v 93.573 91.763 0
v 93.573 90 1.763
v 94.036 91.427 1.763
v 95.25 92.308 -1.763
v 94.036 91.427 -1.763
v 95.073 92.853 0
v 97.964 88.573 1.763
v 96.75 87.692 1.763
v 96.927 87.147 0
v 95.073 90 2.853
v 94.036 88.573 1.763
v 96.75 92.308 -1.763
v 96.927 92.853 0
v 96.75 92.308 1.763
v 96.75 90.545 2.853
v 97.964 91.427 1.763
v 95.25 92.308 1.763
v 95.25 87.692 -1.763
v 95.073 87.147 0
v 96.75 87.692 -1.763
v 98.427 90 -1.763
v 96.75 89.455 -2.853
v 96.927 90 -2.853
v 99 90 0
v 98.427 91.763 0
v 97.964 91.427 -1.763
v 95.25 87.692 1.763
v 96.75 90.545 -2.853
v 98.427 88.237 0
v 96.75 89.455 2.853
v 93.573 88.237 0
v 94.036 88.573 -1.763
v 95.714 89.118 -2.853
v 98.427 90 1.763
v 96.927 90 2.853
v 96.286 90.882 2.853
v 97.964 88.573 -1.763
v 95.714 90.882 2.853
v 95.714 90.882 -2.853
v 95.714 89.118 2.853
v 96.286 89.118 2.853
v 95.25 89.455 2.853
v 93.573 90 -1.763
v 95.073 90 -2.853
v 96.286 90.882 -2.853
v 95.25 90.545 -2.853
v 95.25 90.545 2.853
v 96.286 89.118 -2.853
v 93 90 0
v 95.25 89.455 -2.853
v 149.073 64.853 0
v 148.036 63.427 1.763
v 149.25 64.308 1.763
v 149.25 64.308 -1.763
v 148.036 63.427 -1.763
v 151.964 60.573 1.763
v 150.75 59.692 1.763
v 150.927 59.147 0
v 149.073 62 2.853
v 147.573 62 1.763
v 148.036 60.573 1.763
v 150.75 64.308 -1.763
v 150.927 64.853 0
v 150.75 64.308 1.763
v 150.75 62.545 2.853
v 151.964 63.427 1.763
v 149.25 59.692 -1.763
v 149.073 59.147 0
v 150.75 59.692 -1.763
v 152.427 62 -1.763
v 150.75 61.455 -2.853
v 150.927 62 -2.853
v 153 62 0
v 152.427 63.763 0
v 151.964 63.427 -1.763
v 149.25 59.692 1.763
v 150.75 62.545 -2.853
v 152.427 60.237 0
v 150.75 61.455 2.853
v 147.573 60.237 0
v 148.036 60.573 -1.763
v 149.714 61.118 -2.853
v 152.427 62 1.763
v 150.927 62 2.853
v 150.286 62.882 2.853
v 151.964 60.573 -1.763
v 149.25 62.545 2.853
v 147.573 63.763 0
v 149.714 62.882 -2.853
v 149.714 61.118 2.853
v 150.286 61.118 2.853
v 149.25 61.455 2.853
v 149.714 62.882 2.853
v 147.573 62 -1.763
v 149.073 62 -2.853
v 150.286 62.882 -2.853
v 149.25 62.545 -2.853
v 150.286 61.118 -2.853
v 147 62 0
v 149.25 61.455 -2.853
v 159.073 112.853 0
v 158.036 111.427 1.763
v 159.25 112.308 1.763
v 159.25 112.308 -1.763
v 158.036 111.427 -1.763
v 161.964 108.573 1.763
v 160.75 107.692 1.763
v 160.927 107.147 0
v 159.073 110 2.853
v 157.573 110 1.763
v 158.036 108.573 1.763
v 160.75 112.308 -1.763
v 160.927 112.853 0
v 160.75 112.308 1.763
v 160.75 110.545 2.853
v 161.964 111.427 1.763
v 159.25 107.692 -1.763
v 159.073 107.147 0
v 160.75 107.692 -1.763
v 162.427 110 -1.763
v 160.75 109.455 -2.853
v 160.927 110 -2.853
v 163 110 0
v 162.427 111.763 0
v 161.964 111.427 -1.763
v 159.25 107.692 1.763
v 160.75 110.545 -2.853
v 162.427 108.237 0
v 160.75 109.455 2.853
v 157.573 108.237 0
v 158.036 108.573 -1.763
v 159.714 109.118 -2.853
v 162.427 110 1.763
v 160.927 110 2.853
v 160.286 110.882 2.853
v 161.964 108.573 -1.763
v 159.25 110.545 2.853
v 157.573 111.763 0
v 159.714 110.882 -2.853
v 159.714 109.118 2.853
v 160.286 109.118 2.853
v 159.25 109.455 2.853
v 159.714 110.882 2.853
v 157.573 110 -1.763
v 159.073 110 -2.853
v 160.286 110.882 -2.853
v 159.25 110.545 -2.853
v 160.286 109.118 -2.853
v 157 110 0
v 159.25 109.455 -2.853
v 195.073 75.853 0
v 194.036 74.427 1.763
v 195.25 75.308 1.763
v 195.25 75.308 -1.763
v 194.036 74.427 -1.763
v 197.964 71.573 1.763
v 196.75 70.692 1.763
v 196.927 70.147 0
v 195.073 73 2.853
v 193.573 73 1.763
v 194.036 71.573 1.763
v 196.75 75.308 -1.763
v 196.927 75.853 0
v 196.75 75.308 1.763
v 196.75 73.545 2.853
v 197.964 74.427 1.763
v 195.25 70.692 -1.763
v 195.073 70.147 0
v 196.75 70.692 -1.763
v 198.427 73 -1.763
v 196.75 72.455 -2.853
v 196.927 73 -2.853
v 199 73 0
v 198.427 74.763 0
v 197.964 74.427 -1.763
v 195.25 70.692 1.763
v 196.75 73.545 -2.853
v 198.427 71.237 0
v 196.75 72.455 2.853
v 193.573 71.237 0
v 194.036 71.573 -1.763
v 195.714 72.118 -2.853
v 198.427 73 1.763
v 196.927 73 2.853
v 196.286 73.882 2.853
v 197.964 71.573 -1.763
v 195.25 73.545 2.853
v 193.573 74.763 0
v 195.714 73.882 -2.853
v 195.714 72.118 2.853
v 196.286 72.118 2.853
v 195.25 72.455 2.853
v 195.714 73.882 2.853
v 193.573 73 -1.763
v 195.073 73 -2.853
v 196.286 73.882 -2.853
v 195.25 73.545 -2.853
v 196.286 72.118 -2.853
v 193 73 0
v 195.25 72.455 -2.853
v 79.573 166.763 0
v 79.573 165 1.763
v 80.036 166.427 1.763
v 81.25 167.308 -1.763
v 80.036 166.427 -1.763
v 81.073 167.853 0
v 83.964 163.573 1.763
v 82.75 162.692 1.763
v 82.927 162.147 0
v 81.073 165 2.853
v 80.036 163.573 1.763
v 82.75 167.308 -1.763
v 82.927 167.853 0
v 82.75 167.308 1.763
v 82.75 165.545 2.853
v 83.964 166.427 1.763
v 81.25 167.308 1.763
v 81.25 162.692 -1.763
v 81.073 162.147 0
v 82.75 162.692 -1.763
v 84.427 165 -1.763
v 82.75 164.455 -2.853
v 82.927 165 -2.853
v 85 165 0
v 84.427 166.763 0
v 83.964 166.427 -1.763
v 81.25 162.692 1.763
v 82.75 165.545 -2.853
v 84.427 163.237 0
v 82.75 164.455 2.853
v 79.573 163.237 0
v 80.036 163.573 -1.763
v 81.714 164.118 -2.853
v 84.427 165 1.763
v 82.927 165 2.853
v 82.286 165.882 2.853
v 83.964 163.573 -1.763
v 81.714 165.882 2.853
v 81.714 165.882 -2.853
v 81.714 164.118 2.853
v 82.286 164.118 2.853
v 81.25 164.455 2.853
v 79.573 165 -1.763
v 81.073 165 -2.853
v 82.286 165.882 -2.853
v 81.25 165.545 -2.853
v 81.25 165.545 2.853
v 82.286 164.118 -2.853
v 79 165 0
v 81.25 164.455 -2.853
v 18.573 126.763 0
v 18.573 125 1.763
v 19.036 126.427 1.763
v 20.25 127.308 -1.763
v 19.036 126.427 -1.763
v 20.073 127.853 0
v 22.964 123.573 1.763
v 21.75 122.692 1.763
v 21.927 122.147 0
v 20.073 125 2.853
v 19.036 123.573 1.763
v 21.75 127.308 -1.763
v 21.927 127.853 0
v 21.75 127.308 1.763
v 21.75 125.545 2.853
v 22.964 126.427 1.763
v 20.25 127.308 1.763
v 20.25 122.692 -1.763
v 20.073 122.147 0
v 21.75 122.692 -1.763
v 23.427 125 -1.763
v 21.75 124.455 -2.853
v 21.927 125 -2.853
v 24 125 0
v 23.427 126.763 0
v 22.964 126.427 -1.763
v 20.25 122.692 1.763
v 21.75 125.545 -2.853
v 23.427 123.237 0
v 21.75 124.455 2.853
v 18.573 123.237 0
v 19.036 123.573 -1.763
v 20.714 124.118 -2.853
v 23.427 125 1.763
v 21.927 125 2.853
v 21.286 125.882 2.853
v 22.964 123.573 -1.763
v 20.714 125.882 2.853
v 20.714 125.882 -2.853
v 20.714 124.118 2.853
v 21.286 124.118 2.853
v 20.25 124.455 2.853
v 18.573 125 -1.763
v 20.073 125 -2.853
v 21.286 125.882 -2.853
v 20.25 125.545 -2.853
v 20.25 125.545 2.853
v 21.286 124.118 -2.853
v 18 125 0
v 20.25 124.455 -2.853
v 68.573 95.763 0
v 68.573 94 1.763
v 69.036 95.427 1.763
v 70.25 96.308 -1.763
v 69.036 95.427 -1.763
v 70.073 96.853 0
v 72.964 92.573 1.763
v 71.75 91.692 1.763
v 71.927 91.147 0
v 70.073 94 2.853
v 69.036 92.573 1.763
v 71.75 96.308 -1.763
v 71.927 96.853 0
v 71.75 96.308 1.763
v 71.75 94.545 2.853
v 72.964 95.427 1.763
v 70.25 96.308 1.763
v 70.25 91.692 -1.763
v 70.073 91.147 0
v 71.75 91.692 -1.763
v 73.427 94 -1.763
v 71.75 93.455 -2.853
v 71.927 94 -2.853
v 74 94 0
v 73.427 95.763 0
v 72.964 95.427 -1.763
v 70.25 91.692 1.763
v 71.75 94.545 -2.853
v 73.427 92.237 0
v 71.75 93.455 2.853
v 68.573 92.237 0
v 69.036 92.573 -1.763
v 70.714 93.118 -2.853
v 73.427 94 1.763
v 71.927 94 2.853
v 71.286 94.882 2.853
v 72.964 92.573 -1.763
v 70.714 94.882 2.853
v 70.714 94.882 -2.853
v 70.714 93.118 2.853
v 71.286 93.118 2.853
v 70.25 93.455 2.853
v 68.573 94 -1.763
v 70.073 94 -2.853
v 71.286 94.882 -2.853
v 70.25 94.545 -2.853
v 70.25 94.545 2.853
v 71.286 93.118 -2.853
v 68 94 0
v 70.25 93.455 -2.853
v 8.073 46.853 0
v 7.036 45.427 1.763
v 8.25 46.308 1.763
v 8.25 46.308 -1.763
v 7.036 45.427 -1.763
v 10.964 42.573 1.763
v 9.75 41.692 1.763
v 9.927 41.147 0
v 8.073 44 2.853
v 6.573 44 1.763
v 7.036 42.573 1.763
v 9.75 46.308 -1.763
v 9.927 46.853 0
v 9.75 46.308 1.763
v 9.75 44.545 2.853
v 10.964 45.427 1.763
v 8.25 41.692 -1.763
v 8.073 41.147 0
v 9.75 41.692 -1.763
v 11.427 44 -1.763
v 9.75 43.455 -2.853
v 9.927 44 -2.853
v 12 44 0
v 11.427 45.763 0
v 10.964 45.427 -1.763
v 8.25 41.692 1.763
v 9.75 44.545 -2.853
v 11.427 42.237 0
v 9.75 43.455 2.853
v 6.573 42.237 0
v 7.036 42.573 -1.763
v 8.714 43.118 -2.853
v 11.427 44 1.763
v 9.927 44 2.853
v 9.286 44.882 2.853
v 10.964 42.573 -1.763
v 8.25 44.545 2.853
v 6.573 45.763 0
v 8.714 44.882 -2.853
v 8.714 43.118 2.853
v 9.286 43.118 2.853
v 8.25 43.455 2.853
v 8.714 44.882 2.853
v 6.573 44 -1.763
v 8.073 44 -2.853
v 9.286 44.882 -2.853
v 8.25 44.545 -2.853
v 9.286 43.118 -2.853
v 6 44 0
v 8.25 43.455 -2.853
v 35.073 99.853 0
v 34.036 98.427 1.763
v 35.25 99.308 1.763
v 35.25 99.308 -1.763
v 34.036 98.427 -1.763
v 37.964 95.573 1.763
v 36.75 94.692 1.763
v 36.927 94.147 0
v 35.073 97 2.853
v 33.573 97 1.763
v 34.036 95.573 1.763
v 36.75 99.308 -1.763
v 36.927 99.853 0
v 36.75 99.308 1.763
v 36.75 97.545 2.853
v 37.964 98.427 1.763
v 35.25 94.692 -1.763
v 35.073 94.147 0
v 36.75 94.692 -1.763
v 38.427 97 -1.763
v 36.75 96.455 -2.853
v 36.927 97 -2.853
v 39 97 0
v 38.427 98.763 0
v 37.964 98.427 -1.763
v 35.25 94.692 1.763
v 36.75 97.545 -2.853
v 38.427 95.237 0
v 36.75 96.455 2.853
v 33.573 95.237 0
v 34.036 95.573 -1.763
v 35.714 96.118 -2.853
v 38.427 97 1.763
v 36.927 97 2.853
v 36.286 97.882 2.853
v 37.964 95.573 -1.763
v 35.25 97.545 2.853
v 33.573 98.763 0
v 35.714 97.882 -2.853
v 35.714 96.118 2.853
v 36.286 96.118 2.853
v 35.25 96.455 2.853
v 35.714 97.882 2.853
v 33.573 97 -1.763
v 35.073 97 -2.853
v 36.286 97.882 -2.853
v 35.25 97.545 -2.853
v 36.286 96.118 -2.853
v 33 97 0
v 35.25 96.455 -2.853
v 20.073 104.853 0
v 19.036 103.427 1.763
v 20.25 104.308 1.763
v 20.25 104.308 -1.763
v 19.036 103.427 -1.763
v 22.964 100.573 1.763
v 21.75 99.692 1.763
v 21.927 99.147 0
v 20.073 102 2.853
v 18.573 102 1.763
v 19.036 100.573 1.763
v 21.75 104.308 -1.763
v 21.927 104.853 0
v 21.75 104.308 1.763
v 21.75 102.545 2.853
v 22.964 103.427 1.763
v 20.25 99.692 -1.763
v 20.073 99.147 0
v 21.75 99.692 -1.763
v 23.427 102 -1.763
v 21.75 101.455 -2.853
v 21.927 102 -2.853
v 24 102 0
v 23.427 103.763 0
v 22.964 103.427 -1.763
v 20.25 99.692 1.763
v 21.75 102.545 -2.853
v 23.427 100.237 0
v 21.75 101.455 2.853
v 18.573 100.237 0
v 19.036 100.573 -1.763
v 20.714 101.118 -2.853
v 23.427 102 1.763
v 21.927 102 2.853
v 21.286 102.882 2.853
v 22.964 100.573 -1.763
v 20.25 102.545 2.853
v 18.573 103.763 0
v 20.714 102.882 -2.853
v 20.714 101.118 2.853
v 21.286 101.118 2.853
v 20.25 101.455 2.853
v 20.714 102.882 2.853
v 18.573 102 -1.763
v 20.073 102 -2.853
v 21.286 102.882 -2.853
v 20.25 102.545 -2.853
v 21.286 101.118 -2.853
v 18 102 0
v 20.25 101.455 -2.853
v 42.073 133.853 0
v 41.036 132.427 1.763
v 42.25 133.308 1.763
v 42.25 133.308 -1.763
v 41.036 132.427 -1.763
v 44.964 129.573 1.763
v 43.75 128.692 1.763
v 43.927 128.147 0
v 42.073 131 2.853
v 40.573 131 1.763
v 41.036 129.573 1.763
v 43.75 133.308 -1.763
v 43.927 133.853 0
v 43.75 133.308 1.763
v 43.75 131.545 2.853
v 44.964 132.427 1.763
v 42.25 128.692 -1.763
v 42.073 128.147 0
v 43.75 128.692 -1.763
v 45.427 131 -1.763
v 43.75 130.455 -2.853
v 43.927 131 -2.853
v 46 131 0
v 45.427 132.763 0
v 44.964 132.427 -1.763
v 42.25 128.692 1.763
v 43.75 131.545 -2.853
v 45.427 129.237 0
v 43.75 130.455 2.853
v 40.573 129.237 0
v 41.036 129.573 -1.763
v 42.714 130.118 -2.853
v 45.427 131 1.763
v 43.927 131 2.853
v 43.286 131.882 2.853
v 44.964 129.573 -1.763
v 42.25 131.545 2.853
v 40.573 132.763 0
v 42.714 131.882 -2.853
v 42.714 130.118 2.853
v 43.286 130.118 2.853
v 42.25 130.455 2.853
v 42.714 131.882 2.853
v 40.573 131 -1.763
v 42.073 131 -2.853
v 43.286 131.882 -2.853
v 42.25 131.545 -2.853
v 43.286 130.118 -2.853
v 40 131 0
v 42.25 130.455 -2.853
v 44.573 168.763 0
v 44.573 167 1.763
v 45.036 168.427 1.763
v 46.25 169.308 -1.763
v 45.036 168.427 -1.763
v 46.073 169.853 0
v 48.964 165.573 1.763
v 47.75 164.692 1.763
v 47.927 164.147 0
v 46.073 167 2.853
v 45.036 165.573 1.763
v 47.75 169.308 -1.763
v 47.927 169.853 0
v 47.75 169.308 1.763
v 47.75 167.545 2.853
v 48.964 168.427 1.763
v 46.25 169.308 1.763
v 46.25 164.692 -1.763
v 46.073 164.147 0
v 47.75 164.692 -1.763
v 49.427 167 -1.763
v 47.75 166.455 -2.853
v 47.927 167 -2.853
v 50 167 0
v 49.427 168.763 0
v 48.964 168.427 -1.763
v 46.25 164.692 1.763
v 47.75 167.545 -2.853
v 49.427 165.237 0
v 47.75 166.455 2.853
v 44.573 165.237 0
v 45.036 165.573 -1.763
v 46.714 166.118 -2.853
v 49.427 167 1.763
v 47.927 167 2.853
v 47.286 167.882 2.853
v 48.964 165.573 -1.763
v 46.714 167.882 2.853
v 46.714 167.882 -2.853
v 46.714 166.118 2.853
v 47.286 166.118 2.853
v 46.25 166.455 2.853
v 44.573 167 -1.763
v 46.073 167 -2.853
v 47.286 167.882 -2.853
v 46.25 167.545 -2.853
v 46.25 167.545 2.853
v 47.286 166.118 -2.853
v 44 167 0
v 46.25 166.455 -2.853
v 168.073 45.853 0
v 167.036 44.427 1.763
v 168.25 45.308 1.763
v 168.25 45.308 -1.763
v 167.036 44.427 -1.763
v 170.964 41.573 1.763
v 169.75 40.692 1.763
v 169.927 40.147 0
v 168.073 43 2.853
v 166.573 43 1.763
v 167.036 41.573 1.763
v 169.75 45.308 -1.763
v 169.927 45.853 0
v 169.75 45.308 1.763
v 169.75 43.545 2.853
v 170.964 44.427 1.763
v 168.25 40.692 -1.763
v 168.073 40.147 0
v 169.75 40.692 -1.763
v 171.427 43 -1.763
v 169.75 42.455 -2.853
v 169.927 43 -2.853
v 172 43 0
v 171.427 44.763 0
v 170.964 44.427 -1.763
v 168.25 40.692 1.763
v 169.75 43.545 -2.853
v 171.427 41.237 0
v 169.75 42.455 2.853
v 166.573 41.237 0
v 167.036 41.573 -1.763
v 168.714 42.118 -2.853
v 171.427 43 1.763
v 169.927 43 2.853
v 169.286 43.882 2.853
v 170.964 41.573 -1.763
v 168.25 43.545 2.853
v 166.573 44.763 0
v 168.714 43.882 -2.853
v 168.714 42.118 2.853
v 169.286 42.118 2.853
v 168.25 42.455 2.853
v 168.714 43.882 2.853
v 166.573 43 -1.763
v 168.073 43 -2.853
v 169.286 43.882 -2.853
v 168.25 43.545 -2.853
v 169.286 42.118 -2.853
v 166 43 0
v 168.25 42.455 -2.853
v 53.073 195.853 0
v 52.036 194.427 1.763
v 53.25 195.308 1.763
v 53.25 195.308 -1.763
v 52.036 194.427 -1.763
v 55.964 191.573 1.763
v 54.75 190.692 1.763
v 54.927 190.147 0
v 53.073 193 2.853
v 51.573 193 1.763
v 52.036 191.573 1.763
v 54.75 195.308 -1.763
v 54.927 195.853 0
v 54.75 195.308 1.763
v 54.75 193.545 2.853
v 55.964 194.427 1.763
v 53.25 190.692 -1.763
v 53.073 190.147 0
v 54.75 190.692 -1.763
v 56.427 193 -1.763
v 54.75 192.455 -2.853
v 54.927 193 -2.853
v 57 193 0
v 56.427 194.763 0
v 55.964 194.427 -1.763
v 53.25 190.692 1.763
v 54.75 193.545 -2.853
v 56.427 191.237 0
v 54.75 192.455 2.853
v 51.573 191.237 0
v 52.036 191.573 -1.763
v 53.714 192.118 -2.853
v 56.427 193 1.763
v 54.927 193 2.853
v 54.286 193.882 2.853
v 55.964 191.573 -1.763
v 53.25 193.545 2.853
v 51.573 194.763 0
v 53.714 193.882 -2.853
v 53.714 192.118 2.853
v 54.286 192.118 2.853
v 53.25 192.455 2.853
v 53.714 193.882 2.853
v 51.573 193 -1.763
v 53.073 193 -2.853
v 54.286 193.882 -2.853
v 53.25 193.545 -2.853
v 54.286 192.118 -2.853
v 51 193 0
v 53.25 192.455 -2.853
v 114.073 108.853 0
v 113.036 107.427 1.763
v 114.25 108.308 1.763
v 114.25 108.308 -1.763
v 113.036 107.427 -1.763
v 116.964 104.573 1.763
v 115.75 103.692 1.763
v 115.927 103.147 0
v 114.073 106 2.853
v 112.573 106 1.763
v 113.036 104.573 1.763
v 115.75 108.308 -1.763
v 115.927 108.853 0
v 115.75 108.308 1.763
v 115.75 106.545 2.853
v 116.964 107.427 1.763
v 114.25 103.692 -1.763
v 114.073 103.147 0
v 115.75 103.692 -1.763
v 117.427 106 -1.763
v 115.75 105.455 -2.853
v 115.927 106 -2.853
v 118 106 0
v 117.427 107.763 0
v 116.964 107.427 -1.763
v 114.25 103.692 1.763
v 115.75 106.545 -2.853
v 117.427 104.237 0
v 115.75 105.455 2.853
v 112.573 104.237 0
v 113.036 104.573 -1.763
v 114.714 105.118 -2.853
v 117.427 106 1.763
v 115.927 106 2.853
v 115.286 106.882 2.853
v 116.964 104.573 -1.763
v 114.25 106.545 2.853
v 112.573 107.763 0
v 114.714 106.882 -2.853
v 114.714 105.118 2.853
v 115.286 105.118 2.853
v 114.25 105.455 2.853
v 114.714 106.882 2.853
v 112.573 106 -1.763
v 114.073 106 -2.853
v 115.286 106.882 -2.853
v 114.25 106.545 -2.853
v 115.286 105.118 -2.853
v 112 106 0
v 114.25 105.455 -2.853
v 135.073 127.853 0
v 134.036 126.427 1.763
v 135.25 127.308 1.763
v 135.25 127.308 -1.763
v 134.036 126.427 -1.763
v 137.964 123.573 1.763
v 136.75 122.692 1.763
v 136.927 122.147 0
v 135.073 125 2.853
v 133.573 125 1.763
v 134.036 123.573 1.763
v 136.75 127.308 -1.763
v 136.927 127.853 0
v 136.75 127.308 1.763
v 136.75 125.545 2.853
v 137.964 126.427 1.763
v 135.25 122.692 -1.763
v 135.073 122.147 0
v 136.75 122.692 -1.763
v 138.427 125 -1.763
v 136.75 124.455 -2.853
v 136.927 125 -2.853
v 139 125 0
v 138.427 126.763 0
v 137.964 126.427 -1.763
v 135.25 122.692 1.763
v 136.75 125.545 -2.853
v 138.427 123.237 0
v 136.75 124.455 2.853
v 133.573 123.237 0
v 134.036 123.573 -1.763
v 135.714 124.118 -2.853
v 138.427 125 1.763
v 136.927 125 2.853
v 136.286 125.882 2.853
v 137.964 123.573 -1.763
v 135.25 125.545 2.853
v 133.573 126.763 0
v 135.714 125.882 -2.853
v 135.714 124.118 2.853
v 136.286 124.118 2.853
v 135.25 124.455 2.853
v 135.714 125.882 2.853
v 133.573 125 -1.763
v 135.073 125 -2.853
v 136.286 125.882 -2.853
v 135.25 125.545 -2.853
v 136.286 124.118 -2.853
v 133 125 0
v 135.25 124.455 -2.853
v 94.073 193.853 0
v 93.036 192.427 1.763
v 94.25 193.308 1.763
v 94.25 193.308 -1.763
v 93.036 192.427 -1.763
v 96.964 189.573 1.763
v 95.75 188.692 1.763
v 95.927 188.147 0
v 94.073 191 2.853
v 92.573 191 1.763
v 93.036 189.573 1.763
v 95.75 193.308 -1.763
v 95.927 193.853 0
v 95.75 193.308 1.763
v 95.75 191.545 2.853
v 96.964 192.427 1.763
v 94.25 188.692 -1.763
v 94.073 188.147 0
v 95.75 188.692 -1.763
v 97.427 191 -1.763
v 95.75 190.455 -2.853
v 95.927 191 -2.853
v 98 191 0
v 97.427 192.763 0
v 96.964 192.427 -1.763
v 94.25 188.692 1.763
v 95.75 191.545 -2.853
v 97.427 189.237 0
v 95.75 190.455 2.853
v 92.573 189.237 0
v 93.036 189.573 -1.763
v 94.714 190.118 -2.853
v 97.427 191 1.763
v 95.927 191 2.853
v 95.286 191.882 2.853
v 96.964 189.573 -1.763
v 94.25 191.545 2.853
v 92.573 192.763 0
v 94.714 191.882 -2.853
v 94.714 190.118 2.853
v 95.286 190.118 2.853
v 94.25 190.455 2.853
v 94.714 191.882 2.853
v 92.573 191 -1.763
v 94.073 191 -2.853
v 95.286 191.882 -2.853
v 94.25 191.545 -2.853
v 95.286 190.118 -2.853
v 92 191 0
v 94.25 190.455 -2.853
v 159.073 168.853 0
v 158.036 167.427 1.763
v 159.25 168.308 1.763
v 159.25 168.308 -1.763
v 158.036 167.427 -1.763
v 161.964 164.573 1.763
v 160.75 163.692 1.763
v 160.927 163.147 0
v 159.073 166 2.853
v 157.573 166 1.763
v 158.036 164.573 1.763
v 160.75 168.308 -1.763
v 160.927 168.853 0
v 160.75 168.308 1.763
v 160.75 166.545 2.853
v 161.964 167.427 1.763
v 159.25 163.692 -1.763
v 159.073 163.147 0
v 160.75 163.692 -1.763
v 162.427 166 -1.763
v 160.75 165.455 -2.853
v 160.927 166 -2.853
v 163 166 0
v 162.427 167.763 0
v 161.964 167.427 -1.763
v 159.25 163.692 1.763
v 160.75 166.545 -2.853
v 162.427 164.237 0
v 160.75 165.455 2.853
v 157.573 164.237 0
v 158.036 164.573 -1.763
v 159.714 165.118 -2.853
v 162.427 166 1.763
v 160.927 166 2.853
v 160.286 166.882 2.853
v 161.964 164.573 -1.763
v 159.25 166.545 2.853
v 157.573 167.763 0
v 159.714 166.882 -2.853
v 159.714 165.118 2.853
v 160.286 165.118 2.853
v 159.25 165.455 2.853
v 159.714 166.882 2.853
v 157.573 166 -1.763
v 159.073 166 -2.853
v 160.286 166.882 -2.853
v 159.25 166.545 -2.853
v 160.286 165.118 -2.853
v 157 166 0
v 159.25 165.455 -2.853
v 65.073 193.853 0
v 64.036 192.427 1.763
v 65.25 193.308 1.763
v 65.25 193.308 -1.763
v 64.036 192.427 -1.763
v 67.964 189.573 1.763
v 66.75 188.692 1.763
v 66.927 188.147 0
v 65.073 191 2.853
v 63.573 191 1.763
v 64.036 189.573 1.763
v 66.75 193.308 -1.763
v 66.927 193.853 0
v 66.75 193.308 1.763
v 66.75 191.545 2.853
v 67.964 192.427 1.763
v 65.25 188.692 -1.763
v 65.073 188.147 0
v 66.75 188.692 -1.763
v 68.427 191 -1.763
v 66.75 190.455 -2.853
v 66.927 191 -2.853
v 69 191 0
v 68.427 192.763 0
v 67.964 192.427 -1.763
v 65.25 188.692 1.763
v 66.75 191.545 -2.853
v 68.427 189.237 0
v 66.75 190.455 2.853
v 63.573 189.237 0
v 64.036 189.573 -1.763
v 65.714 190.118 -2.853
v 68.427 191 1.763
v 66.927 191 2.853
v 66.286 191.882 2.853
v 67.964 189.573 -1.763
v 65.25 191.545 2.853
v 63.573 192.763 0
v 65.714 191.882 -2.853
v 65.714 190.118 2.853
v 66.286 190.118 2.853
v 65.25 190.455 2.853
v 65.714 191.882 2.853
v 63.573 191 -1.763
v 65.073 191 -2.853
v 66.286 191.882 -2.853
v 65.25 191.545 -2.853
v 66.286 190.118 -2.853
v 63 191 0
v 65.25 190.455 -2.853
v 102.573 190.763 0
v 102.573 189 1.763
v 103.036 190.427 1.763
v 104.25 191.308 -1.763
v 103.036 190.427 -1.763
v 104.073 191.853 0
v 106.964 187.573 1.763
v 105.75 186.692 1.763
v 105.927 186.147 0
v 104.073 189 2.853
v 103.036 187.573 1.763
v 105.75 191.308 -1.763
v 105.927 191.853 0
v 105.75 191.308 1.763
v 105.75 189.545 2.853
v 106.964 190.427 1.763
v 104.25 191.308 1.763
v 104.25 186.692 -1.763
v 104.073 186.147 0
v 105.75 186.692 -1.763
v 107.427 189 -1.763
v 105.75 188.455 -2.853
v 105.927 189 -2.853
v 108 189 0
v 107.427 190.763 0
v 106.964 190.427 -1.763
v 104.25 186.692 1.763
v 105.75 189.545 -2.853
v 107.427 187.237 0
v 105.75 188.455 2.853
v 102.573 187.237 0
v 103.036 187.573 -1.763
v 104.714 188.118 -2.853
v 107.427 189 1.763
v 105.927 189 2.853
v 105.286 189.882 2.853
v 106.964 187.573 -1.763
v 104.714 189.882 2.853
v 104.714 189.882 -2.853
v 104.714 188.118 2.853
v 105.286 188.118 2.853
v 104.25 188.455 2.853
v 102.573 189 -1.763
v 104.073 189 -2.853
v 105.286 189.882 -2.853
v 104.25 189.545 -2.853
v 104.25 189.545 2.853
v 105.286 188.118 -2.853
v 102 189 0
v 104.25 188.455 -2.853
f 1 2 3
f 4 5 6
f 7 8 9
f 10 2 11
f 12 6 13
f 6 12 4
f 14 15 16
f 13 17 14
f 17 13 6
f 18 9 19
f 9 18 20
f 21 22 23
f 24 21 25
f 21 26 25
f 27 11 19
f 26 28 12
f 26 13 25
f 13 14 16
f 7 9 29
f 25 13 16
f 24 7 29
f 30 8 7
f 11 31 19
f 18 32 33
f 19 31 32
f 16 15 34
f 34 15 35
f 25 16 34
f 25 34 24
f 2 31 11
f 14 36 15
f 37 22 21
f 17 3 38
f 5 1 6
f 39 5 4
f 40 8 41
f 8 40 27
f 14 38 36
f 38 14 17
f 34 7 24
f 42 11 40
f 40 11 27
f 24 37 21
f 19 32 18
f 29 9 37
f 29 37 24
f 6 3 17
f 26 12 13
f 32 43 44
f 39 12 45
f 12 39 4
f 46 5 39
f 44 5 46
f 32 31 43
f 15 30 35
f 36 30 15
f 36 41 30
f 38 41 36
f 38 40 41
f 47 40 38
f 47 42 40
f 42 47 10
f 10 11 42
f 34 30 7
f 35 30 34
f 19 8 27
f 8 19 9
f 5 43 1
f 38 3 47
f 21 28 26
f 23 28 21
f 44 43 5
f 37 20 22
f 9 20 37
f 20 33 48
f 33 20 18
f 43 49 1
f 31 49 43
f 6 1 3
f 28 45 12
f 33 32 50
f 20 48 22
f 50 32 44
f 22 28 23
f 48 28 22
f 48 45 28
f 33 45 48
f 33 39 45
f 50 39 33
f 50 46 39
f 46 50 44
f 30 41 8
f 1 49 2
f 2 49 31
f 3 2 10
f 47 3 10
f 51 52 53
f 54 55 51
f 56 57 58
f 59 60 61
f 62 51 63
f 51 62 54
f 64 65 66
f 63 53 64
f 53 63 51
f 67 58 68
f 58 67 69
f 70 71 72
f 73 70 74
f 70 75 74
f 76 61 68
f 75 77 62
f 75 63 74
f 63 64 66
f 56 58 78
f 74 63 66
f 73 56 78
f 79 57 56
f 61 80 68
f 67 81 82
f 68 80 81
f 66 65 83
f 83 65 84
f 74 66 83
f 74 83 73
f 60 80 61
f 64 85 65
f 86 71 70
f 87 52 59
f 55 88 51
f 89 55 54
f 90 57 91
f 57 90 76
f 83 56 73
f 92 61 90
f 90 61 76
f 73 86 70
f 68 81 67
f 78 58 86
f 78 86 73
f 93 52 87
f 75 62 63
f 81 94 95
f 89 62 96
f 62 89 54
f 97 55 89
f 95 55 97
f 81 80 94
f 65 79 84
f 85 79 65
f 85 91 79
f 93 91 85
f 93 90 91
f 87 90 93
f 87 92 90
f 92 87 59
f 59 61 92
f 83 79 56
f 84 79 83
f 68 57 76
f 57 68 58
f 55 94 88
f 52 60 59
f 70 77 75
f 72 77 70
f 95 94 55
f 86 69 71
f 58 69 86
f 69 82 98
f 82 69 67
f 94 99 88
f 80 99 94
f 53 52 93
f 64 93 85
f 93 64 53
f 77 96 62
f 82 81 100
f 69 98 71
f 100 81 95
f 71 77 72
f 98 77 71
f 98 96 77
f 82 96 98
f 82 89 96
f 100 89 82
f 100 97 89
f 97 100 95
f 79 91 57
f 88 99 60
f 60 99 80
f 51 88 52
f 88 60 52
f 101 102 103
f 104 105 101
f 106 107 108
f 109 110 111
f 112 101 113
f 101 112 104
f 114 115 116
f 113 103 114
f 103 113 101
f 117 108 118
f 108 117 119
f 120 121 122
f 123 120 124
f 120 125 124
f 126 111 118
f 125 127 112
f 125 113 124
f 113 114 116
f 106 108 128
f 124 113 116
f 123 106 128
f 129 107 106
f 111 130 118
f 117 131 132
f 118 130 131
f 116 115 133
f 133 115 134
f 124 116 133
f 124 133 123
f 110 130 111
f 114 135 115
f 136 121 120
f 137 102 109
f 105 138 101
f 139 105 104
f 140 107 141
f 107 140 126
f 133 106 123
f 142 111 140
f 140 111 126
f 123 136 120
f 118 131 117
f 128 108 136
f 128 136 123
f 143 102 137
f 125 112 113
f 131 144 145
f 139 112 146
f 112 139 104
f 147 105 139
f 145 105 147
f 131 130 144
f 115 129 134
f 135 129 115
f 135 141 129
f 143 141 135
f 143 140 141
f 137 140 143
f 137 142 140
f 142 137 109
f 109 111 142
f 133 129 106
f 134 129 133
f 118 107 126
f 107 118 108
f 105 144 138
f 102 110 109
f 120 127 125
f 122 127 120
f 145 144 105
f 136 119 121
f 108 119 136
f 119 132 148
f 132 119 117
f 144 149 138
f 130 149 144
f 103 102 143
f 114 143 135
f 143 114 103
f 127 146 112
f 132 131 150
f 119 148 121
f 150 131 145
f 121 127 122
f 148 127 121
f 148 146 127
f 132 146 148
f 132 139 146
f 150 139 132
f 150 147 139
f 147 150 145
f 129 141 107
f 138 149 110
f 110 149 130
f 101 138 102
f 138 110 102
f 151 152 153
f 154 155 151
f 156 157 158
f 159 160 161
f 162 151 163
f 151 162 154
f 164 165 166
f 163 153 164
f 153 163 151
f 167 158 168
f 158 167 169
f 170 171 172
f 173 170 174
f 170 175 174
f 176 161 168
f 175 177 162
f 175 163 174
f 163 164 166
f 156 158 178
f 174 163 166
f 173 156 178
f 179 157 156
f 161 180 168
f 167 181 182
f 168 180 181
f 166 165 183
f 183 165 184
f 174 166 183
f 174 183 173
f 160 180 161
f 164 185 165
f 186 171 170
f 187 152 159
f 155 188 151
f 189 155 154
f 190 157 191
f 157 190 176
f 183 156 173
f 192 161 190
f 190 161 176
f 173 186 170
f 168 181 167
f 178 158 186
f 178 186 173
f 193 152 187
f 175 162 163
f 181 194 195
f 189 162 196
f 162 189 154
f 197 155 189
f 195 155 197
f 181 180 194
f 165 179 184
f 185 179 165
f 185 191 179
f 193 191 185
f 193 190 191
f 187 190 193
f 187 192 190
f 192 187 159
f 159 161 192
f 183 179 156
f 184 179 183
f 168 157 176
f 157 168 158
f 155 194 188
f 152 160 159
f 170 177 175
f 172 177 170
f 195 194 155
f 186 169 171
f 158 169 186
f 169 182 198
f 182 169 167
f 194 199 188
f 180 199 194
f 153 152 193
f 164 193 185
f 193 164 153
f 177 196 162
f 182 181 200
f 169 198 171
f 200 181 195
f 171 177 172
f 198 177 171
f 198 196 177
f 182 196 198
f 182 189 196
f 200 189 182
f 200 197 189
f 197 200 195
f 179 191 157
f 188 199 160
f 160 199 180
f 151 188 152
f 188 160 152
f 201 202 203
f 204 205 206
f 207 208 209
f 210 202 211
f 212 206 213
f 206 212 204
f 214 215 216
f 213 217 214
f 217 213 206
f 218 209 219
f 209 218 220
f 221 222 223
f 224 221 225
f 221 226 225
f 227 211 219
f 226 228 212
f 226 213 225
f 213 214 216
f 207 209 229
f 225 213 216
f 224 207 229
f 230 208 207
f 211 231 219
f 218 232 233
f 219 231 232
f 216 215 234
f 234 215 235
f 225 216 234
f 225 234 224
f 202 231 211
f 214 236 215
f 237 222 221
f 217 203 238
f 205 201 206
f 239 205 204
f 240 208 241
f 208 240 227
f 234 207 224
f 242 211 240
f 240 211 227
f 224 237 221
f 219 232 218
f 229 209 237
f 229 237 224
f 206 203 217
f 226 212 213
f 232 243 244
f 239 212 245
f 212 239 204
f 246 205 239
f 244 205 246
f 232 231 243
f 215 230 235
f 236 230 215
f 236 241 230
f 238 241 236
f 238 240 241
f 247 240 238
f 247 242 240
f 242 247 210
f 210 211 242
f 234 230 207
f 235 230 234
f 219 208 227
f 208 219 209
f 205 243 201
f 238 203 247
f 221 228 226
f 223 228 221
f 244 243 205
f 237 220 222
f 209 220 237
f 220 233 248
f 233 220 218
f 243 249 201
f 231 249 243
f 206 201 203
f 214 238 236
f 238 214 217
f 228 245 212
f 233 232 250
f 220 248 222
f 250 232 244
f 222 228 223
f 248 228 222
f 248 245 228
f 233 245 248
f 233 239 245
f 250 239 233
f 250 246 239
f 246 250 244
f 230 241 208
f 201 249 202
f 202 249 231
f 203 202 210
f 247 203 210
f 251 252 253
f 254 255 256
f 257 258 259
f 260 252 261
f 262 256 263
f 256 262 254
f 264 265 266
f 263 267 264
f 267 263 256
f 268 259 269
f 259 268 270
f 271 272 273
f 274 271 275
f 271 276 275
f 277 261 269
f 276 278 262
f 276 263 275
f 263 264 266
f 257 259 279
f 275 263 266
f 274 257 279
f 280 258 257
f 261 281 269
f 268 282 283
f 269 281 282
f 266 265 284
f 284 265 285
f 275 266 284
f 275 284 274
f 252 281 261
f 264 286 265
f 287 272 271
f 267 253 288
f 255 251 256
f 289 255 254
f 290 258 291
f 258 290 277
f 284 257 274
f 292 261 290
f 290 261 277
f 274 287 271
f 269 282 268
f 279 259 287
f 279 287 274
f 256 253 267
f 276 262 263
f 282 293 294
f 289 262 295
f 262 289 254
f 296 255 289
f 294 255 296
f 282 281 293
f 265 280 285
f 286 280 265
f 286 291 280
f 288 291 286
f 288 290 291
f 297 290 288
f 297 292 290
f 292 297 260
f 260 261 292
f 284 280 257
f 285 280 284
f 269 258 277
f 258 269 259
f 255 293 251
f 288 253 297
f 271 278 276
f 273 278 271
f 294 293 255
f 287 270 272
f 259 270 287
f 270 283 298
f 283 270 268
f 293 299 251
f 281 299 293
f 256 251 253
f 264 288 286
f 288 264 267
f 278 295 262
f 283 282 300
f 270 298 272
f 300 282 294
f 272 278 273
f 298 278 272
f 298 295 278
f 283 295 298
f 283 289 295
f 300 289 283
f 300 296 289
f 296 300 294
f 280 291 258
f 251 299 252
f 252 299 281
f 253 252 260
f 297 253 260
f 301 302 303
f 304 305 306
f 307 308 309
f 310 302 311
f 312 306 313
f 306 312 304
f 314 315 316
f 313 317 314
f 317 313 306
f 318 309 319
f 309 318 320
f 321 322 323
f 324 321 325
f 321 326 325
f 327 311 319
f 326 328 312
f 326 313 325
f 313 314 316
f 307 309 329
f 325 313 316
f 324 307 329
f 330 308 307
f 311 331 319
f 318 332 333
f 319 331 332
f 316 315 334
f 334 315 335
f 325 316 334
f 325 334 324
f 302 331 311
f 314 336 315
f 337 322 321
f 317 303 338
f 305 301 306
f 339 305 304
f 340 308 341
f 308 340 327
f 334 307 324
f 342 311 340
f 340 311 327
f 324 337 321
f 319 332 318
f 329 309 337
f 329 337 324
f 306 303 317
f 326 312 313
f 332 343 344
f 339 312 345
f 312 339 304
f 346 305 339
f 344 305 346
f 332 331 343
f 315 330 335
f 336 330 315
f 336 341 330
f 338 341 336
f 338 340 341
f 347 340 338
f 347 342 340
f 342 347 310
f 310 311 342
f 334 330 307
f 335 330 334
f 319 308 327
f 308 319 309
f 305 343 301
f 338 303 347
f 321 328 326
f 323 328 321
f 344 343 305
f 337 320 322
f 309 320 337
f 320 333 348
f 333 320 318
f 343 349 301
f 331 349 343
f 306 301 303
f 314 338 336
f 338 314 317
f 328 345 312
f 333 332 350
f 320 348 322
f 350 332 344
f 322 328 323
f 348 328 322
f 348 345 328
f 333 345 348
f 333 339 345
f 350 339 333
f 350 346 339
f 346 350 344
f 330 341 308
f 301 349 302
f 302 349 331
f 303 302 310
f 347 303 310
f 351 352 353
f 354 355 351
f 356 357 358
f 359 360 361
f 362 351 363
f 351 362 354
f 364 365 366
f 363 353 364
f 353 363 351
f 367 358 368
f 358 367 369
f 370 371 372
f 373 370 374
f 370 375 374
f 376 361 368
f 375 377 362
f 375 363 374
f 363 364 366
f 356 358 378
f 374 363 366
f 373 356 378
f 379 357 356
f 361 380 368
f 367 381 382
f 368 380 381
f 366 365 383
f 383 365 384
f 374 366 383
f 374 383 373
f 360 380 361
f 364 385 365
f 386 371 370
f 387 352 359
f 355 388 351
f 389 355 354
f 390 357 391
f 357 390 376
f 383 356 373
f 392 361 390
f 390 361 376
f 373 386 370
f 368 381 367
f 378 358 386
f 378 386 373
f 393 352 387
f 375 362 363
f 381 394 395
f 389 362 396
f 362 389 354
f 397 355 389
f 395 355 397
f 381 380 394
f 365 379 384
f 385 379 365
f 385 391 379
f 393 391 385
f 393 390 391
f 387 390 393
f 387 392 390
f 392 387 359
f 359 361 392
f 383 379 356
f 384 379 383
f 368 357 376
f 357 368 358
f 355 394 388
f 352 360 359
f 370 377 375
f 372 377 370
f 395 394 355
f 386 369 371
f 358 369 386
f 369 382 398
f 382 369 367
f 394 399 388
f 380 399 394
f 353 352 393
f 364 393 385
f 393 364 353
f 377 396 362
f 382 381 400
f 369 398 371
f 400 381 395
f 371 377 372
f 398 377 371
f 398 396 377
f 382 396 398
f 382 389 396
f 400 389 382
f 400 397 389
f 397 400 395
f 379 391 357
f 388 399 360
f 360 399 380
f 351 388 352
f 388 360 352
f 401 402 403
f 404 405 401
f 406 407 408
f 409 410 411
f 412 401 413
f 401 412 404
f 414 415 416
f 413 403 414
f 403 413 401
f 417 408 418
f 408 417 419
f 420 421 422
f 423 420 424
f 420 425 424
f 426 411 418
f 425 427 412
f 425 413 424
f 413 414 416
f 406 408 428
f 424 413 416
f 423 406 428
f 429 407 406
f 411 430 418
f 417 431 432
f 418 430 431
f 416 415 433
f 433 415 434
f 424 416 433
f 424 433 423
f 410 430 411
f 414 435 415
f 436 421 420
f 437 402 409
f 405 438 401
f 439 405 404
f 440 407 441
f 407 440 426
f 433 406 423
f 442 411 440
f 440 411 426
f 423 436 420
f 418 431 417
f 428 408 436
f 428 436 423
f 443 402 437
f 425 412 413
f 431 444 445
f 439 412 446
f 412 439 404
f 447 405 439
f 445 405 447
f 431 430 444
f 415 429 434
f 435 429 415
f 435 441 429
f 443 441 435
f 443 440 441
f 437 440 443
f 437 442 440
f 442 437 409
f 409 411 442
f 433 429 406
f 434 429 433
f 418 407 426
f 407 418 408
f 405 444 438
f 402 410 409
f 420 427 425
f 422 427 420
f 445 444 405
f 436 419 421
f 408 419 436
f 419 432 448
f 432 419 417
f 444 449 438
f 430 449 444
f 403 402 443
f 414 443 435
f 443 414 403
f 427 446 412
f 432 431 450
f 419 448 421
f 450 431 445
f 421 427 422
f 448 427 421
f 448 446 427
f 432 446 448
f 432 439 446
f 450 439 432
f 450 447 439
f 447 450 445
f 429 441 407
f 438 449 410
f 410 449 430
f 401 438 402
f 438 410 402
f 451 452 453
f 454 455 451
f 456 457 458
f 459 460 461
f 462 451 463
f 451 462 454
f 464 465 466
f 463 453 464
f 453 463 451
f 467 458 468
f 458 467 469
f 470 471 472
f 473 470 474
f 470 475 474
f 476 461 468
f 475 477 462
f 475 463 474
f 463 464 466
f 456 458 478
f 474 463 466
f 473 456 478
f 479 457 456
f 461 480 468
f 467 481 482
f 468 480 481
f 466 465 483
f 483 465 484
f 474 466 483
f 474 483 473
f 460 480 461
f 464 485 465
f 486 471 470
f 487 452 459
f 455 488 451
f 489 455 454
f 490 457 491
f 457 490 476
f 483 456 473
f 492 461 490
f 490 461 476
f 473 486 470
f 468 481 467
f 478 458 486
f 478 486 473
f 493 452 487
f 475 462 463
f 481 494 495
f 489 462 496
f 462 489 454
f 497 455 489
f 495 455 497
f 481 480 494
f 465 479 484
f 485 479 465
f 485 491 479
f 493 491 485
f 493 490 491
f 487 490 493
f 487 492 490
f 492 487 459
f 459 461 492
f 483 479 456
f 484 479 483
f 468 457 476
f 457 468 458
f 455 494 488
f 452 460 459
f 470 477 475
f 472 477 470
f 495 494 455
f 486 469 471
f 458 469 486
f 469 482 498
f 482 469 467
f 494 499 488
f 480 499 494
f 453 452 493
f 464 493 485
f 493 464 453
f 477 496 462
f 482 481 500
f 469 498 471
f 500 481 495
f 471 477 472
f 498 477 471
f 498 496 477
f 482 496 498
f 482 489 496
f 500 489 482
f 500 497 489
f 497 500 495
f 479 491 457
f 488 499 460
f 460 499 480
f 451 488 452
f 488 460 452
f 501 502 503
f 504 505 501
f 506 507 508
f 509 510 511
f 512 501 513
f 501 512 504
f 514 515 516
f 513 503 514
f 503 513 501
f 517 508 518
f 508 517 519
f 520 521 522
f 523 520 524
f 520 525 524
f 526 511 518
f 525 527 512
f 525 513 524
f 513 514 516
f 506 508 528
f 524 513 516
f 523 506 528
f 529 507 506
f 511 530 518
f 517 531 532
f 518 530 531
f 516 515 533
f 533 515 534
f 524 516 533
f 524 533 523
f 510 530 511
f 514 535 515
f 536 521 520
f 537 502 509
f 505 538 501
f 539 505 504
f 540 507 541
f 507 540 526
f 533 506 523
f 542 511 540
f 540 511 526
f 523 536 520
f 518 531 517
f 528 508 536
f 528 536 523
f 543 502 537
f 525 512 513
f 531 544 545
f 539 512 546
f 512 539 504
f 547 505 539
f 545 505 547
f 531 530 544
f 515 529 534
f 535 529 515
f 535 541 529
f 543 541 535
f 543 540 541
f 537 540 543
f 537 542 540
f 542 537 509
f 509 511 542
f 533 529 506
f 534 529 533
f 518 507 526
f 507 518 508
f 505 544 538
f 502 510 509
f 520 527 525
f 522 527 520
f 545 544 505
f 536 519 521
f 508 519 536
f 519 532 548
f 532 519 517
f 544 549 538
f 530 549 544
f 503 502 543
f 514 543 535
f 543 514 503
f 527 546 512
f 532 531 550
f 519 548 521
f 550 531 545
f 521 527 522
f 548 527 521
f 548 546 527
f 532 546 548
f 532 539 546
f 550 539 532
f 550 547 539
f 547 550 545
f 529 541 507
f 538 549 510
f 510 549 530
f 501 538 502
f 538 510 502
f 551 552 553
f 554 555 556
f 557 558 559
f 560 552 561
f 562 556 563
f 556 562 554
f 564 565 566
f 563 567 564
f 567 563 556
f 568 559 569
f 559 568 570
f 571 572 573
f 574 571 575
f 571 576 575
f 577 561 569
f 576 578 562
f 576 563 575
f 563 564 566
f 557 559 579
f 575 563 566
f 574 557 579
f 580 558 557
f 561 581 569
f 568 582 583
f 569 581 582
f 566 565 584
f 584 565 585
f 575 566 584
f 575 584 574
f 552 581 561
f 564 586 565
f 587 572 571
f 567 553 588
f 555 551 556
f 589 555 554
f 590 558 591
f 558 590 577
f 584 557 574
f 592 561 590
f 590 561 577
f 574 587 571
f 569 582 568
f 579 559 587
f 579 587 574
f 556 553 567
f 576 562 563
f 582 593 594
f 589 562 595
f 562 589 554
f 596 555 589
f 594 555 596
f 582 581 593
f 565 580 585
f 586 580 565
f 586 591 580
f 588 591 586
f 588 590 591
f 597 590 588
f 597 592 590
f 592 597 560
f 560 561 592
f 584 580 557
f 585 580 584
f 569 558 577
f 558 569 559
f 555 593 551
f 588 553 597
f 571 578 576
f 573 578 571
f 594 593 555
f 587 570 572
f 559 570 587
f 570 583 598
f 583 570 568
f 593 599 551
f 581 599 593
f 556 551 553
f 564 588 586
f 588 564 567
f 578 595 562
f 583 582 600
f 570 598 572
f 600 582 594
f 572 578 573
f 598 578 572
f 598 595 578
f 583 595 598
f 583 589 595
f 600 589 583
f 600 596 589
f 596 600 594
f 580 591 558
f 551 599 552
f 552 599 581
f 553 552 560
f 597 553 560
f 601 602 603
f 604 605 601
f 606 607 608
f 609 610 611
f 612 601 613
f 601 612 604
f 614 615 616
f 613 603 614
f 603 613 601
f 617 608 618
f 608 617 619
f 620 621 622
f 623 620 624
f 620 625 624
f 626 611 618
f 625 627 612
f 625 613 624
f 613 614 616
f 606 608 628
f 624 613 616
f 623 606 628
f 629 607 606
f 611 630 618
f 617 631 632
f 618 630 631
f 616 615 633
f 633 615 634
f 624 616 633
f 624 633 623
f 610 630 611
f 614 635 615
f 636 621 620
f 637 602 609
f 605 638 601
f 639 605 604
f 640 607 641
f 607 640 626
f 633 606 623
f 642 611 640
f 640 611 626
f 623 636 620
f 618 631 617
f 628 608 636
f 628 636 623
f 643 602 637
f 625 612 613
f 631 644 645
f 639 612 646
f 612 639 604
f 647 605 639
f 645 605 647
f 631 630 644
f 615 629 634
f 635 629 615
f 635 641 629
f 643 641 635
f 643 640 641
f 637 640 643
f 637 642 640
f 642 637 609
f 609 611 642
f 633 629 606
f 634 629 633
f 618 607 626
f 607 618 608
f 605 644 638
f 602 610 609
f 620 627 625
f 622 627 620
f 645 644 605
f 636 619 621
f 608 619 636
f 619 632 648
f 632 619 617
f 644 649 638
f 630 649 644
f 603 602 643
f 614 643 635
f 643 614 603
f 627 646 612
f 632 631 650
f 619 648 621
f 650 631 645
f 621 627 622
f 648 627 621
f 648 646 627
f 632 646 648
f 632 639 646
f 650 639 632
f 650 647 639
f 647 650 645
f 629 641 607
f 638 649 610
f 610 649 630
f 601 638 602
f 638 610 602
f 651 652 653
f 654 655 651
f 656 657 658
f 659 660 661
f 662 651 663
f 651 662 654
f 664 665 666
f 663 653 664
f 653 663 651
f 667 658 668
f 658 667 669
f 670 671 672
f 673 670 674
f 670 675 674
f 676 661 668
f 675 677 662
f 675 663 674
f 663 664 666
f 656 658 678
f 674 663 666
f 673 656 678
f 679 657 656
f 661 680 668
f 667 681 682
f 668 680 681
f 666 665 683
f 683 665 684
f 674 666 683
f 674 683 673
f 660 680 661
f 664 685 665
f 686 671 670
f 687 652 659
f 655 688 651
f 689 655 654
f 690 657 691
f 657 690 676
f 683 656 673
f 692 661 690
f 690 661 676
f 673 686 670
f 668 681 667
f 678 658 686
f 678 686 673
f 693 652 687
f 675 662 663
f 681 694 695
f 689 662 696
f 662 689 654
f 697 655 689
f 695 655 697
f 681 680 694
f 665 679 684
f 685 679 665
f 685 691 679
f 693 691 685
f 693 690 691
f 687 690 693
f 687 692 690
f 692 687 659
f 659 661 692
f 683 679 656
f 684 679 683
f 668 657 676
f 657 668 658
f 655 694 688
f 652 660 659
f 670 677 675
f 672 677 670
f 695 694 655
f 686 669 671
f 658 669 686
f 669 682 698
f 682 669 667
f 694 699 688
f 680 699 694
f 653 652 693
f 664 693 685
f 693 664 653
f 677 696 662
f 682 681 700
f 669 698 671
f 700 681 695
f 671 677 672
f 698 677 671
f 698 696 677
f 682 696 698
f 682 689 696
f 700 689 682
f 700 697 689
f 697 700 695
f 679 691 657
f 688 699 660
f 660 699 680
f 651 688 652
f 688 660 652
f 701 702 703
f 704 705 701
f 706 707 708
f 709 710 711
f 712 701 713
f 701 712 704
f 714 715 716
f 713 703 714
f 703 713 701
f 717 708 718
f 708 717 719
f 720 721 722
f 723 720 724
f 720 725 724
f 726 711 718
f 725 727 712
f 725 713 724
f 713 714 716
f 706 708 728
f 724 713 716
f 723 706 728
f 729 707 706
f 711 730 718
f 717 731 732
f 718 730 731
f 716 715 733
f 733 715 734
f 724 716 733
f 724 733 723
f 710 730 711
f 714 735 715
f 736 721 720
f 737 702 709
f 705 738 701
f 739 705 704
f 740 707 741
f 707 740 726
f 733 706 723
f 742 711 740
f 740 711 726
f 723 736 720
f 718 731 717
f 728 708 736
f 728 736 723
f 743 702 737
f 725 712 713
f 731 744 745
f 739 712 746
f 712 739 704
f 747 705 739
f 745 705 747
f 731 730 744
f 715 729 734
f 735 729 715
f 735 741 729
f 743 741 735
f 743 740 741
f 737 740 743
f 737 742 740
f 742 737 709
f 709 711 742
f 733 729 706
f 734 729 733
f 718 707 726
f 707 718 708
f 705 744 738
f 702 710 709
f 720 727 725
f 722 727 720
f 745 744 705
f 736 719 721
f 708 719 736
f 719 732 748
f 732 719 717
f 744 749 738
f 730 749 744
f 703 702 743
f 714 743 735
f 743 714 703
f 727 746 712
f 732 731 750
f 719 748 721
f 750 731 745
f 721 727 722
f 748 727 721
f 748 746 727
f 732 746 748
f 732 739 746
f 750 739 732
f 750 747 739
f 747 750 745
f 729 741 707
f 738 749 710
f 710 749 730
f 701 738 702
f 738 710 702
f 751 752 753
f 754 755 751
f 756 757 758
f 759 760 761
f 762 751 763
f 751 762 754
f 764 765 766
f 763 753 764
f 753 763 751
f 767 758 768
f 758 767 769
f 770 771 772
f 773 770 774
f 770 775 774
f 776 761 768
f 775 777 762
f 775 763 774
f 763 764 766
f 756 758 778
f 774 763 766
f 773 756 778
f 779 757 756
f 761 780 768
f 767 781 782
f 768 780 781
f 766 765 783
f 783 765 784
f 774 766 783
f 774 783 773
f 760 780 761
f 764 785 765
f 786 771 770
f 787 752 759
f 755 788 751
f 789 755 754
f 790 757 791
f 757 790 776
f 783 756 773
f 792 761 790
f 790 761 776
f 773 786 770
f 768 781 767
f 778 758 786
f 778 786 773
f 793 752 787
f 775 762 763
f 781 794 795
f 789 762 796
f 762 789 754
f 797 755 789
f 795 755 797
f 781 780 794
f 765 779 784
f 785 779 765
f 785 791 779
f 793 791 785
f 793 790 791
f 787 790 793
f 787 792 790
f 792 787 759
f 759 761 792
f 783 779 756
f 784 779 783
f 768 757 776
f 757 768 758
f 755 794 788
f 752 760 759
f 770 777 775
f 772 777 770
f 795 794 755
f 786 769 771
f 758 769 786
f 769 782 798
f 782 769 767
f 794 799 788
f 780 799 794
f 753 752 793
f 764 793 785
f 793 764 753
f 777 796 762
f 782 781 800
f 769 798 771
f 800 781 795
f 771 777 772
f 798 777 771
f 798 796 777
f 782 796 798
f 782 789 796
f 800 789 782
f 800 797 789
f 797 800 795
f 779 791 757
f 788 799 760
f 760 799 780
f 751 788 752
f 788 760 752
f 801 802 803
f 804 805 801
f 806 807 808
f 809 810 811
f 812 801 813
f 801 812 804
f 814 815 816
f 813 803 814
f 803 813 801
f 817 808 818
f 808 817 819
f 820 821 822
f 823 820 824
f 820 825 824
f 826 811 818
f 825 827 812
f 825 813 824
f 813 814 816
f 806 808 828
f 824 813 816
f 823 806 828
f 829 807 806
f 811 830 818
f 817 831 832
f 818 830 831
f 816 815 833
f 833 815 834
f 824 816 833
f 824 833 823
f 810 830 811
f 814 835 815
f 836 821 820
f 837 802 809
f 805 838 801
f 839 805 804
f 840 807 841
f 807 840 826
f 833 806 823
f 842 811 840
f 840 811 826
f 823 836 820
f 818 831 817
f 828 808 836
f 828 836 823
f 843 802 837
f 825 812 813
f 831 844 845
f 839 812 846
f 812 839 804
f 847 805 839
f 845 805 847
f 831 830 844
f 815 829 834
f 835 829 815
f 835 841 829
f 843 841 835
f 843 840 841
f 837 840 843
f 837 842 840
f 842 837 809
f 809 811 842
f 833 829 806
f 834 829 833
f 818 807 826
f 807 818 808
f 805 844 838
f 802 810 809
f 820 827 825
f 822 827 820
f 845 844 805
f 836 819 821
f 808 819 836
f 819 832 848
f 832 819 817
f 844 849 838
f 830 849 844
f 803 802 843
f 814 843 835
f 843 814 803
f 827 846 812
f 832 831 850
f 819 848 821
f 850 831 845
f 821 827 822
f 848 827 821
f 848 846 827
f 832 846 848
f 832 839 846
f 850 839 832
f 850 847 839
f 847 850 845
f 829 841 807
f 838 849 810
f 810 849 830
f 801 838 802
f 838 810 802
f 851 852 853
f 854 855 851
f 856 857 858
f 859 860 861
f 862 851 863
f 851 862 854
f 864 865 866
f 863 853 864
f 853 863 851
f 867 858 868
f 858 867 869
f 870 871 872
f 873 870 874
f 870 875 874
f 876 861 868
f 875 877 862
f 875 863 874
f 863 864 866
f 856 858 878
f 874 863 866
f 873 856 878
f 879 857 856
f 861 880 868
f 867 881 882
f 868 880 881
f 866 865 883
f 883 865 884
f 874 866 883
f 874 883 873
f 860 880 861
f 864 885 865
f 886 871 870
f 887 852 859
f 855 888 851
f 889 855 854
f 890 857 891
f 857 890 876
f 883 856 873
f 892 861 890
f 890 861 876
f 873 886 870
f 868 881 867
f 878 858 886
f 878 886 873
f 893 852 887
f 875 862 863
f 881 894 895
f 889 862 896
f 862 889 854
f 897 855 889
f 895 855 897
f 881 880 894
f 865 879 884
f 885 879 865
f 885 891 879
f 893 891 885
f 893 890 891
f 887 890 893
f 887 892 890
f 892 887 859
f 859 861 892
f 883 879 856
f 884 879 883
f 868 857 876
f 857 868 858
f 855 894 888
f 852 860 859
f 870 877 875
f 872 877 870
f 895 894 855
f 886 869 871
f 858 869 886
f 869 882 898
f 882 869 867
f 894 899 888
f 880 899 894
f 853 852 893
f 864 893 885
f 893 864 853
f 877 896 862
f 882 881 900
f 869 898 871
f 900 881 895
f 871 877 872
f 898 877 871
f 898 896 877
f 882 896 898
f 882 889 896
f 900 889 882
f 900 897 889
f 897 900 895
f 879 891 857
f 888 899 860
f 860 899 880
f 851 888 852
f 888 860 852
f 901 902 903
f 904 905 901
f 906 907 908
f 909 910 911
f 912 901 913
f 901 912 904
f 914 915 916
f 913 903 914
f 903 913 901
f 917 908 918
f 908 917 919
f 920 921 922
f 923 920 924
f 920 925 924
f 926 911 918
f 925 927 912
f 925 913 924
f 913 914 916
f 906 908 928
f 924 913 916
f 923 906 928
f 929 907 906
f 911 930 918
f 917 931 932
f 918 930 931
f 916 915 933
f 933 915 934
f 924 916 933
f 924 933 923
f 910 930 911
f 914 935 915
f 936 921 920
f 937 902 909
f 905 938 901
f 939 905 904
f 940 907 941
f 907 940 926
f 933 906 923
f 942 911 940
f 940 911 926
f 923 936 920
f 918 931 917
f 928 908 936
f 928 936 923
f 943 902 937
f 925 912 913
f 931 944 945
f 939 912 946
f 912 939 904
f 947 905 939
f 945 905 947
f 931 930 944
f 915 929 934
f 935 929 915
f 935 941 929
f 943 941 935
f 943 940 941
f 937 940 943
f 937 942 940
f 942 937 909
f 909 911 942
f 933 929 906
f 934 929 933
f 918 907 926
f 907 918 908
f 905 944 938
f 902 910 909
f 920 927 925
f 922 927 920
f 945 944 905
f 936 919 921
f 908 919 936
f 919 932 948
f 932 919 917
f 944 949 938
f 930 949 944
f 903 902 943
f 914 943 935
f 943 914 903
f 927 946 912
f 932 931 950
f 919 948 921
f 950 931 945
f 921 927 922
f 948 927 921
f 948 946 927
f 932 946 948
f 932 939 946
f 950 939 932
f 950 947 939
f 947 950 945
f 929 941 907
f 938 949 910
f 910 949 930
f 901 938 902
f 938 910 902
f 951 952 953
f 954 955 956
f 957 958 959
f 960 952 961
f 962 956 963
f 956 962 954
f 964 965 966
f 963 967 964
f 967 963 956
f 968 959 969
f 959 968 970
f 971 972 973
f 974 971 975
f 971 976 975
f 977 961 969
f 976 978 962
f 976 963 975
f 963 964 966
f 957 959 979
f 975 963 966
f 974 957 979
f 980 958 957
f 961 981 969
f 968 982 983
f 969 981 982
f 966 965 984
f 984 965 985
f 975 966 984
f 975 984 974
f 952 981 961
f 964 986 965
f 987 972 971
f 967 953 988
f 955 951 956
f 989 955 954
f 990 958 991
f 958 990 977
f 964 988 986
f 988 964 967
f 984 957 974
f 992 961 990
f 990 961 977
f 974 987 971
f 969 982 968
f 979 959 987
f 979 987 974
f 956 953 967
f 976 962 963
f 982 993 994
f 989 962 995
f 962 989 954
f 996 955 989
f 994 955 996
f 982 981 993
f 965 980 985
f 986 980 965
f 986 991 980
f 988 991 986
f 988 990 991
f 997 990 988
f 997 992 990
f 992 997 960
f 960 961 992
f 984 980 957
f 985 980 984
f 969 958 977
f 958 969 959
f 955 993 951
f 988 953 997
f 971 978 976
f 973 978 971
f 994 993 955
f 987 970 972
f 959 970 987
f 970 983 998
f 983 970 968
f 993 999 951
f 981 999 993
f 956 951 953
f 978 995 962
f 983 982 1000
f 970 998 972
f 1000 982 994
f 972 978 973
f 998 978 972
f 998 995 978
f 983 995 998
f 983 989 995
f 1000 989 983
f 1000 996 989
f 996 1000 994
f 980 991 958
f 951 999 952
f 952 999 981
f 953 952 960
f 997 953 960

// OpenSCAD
//Andrew's Monotone Chain 


//random points---------------------------------
function rnd_v(init_value,end_value)=round(rands(init_value,end_value,1)[0]);

init_value=0;
end_value=200;
points_num=20;
points=[
for(i=[0:points_num-1]
    )
    [rnd_v(init_value,end_value),
     rnd_v(init_value,end_value)
    ]];



for(i=[0:points_num-1])
    translate(points[i])
        sphere(3);


//quick_sort------------------------------------

function quick_sort(points)=
     let(leng=len(points)-1)
     leng<1? points:
     let(pivot=points[0])
     let(before=[for(i=[1:leng])
                 if(compare(points[i],pivot))
                     points[i]
                 ])
     let(after=[for(i=[1:leng])
                if(compare(points[i],pivot)==false)
                    points[i]
                ])  
      [each quick_sort(before),pivot,each quick_sort(after)];
//---------------------------------------------
                
//lower。find the lowest/leftmost point.
function compare(pa,pb)=
         pa.x<pb.x || (pa.x==pb.x && pa.y<pb.y)? true: false;                
      
//向量OA叉積向量OB。大於零表示OA到OB為逆時針旋轉。
function cross_(po,pa,pb)=
     (pa.x-po.x)*(pb.y-po.y)-(pa.y-po.y)*(pb.x-po.x);                
            
function angular_compare(po,pa,pb)=
        let(c=cross_(po,pa,pb))
        c>0? true:false;         
                
function append(array,num)=[
     for(i=array)
     i,num];

function pop(array)=
     let(init=0)
     let(leng=len(array)-1)
     leng==0?[]:
     [for(i=[init:leng-1])
          array[i]];                     



function andrew_monotone_chain(points)=
         let(array=quick_sort(points))
         let(upper=andrew_monotone_chain_upper(array))
         let(lower=andrew_monotone_chain_lower(array))
         let(new_array=concat(upper,lower))
         new_array;
         
     
function andrew_monotone_chain_upper(array)=
        let(leng=len(array)-1)
        let(upper=[for(i=[0:leng])
                 if(cross_(array[leng],array[0],array[i])<=0)
                      array[i]
                  ])
        let(upper_leng=len(upper)-1)
        upper_leng<=2? upper:         
        let(stack=[upper[0],upper[1]])
        let(index=len(stack))
        andrew_monotone_chain_upper_inner(upper_leng,index,stack,upper);

function andrew_monotone_chain_upper_inner(upper_leng,index,stack,array)=
       let(stack_leng=len(stack)-1)
       index>upper_leng?stack:
       
       stack_leng<=0?
       let(start_p=stack[0])
       let(pivot_p=array[index])
       let(stack_=append(stack,pivot_p))
       andrew_monotone_chain_upper_inner(upper_leng,index+1,stack_,array):
                 
       let(start_p=stack[stack_leng-1])
       let(pivot_p=stack[stack_leng])
       let(test_p=array[index])
       cross_(start_p,pivot_p,test_p)<=0?
       let(stack_=append(stack,test_p))
       andrew_monotone_chain_upper_inner(upper_leng,index+1,stack_,array):
       let(stack_=pop(stack))
       andrew_monotone_chain_upper_inner(upper_leng,index,stack_,array);  
                 
function andrew_monotone_chain_lower(array)=
        let(leng=len(array)-1)
        let(lower=[for(i=[0:leng])
                if(cross_(array[leng],array[0],array[i])>=0)
                      array[i]              
        ])
        let(lower_leng=len(lower)-1)
        lower_leng<=2? lower:
        let(stack=[lower[0],lower[1]])
        let(index=len(stack))
        andrew_monotone_chain_lower_inner(lower_leng,index,stack,lower); 
               
function andrew_monotone_chain_lower_inner(lower_leng,index,stack,array)=
       let(stack_leng=len(stack)-1)
       index>lower_leng?stack:    
                
       stack_leng<=0?
       let(start_p=stack[0])
       let(pivot_p=array[index])
       let(stack_=append(stack,pivot_p))
       andrew_monotone_chain_lower_inner(lower_leng,index+1,stack_,array):
        
                
       let(start_p=stack[stack_leng-1])
       let(pivot_p=stack[stack_leng])
       let(test_p=array[index])
       cross_(start_p,pivot_p,test_p)>=0?
       let(stack_=append(stack,test_p))
       andrew_monotone_chain_lower_inner(lower_leng,index+1,stack_,array):
       let(stack_=pop(stack))
       andrew_monotone_chain_lower_inner(lower_leng,index,stack_,array);                
                
test=andrew_monotone_chain(points);
echo(test);
for(i=test)
    translate(i)
    color("red")
         sphere(3);

/*                
test1=quick_sort(points);                
translate(test1[0])
     color("blue")
          sphere(3);
translate(test1[points_num-1])
    color("blue")
          sphere(3);            
  */              
                
                
                
                
                
                
